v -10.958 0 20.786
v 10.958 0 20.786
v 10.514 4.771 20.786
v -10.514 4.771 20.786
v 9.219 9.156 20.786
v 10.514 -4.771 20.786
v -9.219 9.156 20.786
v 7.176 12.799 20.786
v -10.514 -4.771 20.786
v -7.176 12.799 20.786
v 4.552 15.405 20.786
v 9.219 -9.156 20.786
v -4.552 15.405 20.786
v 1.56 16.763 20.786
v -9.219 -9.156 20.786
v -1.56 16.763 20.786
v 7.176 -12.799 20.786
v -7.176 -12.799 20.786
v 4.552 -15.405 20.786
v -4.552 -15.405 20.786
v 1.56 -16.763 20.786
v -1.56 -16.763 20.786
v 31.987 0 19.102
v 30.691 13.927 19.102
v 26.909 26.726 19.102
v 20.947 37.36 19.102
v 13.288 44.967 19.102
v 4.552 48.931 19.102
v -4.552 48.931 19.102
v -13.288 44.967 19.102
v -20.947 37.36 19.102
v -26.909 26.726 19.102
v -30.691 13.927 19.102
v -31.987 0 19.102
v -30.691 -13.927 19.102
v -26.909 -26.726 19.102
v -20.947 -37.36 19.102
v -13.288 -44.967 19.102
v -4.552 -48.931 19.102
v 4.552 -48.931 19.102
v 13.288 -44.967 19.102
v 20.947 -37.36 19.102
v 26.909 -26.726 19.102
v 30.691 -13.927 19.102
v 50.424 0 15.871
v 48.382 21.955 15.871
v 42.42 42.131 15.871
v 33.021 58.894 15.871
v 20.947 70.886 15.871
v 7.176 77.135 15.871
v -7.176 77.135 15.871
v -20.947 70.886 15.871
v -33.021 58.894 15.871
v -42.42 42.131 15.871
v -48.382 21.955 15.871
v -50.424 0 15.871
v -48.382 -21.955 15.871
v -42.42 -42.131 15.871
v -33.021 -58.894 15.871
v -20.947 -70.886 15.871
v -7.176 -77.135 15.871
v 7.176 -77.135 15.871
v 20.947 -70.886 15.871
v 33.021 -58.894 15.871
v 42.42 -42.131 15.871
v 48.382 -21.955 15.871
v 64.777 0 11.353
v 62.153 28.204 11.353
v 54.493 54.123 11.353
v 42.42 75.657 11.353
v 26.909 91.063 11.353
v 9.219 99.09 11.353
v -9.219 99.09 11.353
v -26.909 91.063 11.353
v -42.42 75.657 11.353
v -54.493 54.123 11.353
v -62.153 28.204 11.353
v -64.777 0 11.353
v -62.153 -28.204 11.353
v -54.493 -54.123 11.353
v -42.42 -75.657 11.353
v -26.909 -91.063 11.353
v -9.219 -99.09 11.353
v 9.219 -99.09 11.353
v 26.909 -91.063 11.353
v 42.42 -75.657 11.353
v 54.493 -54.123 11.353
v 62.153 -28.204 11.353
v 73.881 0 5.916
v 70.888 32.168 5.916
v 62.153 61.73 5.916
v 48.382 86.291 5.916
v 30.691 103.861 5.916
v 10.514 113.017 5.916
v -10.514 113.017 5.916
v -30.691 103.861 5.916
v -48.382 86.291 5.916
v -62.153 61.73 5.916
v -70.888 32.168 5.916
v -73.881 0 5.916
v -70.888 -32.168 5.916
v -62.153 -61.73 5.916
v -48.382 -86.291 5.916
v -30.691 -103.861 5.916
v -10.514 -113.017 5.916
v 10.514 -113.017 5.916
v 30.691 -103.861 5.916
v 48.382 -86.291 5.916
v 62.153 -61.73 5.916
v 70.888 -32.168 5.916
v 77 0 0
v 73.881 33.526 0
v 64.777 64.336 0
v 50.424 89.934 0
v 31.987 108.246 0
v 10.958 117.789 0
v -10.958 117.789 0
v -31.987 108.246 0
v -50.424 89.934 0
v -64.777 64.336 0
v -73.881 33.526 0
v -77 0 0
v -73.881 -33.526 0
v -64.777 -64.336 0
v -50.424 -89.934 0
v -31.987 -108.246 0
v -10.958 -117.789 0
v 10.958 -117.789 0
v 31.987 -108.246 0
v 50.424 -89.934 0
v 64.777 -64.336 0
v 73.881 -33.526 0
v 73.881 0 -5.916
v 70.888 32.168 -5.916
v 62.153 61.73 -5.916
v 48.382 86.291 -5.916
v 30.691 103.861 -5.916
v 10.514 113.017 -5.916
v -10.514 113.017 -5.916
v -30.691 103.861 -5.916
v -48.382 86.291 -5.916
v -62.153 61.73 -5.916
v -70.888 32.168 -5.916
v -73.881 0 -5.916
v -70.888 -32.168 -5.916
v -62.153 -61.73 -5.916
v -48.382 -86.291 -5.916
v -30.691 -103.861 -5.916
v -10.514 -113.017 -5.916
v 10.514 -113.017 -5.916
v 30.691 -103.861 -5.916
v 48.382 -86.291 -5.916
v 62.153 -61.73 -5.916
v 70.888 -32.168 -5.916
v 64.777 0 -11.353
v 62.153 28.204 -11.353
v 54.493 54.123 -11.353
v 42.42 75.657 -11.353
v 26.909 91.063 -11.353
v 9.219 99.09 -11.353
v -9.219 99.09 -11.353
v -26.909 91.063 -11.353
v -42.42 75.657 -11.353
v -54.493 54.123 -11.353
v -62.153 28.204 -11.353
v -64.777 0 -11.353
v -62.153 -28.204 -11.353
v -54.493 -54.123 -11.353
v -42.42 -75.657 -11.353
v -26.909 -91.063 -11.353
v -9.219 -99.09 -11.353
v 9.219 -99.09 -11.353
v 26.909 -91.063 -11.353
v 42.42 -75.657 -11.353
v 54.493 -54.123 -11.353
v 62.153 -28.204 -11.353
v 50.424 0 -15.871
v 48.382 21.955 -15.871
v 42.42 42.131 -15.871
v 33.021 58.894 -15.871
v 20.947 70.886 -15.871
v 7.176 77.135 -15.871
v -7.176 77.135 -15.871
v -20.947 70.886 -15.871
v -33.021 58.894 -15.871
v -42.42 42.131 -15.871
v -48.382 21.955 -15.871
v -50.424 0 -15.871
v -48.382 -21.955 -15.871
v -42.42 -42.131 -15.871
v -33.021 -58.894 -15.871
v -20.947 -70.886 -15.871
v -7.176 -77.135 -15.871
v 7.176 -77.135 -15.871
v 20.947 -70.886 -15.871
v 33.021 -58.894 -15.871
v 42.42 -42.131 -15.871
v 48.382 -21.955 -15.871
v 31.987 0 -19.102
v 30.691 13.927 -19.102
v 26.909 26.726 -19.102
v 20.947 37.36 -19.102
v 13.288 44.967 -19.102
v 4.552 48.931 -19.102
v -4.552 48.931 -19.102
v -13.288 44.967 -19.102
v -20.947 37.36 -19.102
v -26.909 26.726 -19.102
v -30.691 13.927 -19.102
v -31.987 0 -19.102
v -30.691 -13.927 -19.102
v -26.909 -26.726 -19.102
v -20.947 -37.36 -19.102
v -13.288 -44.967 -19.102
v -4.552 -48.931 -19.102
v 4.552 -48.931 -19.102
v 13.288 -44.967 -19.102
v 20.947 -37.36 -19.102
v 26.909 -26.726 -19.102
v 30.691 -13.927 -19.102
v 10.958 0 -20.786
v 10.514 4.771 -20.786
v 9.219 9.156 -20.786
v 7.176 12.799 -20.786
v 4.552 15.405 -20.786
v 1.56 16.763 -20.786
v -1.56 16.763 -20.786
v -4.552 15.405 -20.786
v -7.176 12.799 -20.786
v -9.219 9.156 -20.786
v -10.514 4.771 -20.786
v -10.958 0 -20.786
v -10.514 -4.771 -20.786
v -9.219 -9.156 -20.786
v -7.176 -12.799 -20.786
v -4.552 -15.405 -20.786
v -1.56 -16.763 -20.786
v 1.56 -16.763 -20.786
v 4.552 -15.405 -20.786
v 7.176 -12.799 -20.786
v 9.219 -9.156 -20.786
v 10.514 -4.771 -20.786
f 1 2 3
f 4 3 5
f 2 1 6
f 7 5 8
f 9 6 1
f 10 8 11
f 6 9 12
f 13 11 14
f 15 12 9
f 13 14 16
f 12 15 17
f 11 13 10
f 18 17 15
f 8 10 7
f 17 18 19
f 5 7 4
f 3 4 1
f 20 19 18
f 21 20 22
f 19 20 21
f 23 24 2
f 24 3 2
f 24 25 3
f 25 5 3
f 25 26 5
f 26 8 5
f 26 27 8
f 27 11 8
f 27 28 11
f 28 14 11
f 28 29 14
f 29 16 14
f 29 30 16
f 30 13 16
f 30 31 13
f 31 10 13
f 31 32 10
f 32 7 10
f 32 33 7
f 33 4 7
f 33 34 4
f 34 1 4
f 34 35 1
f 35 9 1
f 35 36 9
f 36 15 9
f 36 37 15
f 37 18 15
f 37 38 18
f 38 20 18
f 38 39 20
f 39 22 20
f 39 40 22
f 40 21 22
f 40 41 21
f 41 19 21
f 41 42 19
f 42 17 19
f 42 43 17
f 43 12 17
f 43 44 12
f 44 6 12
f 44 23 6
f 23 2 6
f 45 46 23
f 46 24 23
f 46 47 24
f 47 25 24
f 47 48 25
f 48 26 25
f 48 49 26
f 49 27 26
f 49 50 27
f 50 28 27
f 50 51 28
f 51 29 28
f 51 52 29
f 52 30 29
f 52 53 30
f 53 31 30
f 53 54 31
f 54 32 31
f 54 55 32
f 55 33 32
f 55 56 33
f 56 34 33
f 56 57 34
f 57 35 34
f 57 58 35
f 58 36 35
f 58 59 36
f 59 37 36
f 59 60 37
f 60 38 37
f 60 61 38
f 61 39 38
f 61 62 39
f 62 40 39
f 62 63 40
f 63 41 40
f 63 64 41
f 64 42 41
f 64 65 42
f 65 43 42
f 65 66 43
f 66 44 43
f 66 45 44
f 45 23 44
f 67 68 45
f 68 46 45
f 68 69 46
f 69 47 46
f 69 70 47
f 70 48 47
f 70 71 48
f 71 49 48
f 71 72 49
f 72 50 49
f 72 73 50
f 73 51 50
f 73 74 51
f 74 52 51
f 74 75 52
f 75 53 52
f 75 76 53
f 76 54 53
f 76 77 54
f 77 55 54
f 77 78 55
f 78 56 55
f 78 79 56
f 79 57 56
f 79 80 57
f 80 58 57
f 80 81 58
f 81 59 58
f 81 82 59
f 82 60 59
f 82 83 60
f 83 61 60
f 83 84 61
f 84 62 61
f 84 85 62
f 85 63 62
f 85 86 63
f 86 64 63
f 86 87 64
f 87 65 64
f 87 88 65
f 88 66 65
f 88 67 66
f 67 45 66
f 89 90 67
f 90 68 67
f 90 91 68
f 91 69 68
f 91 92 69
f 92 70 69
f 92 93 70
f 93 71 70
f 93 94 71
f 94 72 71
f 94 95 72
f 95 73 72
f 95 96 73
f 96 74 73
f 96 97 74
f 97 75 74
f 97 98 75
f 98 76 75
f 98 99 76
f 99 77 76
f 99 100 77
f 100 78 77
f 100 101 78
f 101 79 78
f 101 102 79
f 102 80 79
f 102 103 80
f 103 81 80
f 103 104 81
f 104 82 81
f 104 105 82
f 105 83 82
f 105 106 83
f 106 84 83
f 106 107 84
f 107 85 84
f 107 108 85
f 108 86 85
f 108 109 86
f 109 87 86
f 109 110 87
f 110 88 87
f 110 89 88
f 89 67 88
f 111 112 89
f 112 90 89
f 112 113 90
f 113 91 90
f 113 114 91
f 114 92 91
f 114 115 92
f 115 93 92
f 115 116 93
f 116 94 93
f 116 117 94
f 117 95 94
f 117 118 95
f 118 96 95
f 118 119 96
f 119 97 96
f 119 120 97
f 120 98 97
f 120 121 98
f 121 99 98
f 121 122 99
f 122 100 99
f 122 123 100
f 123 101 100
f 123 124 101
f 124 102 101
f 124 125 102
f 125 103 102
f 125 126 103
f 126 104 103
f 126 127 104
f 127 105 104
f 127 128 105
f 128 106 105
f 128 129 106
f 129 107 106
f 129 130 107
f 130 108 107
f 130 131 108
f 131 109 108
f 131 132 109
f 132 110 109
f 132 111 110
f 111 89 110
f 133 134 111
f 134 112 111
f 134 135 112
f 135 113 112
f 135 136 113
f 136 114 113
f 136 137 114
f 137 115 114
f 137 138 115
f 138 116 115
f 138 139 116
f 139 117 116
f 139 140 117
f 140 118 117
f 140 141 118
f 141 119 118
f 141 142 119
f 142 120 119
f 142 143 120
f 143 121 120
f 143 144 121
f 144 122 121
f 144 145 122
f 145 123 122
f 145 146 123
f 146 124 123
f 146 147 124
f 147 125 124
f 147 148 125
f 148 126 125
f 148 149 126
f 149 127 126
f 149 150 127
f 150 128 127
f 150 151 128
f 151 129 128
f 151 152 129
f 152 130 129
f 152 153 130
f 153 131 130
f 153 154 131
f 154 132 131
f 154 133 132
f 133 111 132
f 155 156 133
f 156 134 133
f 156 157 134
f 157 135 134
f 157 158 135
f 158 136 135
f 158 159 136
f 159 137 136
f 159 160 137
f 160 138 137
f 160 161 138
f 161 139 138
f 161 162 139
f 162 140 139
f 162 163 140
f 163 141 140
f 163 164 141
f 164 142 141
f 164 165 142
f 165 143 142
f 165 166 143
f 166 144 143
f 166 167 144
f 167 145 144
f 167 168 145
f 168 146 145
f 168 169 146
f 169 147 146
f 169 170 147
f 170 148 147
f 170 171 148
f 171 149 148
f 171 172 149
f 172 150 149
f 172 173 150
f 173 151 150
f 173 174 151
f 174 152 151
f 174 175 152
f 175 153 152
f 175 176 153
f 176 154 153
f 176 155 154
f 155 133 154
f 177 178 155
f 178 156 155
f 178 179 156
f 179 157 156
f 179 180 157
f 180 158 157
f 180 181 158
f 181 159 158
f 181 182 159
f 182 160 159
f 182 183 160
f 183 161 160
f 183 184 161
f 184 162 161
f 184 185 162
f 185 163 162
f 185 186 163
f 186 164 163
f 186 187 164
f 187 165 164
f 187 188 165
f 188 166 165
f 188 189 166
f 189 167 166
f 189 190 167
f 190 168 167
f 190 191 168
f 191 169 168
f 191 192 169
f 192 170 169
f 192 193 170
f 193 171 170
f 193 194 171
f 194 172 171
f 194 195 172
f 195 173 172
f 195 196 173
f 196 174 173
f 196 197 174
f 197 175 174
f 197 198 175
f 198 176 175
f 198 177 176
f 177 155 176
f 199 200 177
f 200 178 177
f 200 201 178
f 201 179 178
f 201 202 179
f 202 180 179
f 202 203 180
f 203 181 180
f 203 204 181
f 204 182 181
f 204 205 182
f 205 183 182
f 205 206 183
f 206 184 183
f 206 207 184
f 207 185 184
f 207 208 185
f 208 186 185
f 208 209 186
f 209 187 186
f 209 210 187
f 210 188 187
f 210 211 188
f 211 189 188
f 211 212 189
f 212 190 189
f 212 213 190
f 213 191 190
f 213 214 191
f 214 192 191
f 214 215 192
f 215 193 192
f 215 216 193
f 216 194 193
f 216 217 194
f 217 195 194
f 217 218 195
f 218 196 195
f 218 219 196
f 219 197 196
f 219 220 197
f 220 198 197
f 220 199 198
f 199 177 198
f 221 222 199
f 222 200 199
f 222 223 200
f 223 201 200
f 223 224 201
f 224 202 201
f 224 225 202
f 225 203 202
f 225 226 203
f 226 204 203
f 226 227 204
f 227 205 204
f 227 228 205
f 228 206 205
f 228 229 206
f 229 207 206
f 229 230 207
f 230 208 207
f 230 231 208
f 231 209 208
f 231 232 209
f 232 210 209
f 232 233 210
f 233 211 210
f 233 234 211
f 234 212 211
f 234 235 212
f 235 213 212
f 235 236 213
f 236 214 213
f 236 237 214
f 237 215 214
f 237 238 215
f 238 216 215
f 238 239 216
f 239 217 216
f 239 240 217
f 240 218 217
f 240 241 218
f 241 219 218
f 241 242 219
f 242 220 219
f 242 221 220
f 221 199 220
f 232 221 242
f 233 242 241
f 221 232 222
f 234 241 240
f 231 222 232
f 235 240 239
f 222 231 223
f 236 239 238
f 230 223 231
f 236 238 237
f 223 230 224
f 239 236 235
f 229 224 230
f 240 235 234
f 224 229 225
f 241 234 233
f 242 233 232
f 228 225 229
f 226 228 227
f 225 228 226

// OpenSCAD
// Generated by SolidPython 1.0.1 on 2020-07-29 00:46:50


scale(v = [11, 17, 3]) {
	sphere(r = 7);
}
/***********************************************
*********      SolidPython code:      **********
************************************************
 
# import packages: SolidPython
from solid import *
from solid.utils import *
from itertools import chain, combinations, permutations


class Resize:

    def __init__(self, scad_file):
        self.scad_file = scad_file
        #self.scad_file = import_scad(scad_file)
        # cone/cylinder param:
        self.r1 = 0
        self.r2 = 0
        self.h = 0
        # rectangular prism param:
        self.w = 0
        self.l = 0
        # ellipse param:
        self.r = 0

    # import OpenScad code (file name corresponds to shape)


    # classify shape + parameters
    def assign(self, param1, param2, param3):
        if self.scad_file == 'cone.scad':
            self.r1 = param1
            self.r2 = param2
            self.h = param3
        elif self.scad_file == 'cylinder.scad':
            self.r1 = param1
            self.r2 = param2
            self.h = param3
        elif self.scad_file == 'rectangularPrism.scad':
            self.h = param1
            self.l = param2
            self.w = param3
        else:
            self.r = param1
            self.h = param2

    # resize parameters
    def iterate(self):
        x = range(3, 20, 2)
        i = 1
        if self.scad_file == 'cone.scad':
            tempList = list(permutations(x, 2))
            for temp in tempList:
                param1 = temp[0]
                param2 = temp[1]
                filepath = 'produced_scad_files/' + 'cone' + str(param1) + '_' + str(param2) + '_' + '.scad'
                scad_render_to_file(cylinder(h=param1, r1=param2, r2=0), filepath)

        elif self.scad_file == 'cylinder.scad':
            tempList = list(permutations(x, 3))
            for temp in tempList:
                param1 = temp[0]
                param2 = temp[1]
                filepath = 'produced_scad_files/' + 'cylinder' + str(param1) + '_' + str(param2) + '_' + '.scad'
                scad_render_to_file(cylinder(h=param1, r1=param2, r2=param2), filepath)

        elif self.scad_file == 'rectangularPrism.scad':
            tempList = list(permutations(x, 3))
            for temp in tempList:
                param1 = temp[0]
                param2 = temp[1]
                param3 = temp[2]
                filepath = 'produced_scad_files/' + 'rectangularPrism' + str(param1) + '_' + str(param2) + '_' + str(
                    param3) + '.scad'
                scad_render_to_file(cube(size=(param1, param2, param3)), filepath)

        elif self.scad_file == 'ellipse.scad':
            tempList = list(permutations(x, 4))
            for temp in tempList:
                param1 = temp[0]
                param2 = temp[1]
                param3 = temp[2]
                param4 = temp[3]
                filepath = 'produced_scad_files/' + 'ellipse' + str(param1) + '_' + str(param2) + '_' + str(param3) + '_' + str(param4) + '.scad'
                scad_render_to_file(scale([param1, param2, param3])(sphere(r=param4)), filepath)

    def render_to_scadfile(self):
        scad_render_to_file(scad, 'example.scad') 
 
************************************************/
